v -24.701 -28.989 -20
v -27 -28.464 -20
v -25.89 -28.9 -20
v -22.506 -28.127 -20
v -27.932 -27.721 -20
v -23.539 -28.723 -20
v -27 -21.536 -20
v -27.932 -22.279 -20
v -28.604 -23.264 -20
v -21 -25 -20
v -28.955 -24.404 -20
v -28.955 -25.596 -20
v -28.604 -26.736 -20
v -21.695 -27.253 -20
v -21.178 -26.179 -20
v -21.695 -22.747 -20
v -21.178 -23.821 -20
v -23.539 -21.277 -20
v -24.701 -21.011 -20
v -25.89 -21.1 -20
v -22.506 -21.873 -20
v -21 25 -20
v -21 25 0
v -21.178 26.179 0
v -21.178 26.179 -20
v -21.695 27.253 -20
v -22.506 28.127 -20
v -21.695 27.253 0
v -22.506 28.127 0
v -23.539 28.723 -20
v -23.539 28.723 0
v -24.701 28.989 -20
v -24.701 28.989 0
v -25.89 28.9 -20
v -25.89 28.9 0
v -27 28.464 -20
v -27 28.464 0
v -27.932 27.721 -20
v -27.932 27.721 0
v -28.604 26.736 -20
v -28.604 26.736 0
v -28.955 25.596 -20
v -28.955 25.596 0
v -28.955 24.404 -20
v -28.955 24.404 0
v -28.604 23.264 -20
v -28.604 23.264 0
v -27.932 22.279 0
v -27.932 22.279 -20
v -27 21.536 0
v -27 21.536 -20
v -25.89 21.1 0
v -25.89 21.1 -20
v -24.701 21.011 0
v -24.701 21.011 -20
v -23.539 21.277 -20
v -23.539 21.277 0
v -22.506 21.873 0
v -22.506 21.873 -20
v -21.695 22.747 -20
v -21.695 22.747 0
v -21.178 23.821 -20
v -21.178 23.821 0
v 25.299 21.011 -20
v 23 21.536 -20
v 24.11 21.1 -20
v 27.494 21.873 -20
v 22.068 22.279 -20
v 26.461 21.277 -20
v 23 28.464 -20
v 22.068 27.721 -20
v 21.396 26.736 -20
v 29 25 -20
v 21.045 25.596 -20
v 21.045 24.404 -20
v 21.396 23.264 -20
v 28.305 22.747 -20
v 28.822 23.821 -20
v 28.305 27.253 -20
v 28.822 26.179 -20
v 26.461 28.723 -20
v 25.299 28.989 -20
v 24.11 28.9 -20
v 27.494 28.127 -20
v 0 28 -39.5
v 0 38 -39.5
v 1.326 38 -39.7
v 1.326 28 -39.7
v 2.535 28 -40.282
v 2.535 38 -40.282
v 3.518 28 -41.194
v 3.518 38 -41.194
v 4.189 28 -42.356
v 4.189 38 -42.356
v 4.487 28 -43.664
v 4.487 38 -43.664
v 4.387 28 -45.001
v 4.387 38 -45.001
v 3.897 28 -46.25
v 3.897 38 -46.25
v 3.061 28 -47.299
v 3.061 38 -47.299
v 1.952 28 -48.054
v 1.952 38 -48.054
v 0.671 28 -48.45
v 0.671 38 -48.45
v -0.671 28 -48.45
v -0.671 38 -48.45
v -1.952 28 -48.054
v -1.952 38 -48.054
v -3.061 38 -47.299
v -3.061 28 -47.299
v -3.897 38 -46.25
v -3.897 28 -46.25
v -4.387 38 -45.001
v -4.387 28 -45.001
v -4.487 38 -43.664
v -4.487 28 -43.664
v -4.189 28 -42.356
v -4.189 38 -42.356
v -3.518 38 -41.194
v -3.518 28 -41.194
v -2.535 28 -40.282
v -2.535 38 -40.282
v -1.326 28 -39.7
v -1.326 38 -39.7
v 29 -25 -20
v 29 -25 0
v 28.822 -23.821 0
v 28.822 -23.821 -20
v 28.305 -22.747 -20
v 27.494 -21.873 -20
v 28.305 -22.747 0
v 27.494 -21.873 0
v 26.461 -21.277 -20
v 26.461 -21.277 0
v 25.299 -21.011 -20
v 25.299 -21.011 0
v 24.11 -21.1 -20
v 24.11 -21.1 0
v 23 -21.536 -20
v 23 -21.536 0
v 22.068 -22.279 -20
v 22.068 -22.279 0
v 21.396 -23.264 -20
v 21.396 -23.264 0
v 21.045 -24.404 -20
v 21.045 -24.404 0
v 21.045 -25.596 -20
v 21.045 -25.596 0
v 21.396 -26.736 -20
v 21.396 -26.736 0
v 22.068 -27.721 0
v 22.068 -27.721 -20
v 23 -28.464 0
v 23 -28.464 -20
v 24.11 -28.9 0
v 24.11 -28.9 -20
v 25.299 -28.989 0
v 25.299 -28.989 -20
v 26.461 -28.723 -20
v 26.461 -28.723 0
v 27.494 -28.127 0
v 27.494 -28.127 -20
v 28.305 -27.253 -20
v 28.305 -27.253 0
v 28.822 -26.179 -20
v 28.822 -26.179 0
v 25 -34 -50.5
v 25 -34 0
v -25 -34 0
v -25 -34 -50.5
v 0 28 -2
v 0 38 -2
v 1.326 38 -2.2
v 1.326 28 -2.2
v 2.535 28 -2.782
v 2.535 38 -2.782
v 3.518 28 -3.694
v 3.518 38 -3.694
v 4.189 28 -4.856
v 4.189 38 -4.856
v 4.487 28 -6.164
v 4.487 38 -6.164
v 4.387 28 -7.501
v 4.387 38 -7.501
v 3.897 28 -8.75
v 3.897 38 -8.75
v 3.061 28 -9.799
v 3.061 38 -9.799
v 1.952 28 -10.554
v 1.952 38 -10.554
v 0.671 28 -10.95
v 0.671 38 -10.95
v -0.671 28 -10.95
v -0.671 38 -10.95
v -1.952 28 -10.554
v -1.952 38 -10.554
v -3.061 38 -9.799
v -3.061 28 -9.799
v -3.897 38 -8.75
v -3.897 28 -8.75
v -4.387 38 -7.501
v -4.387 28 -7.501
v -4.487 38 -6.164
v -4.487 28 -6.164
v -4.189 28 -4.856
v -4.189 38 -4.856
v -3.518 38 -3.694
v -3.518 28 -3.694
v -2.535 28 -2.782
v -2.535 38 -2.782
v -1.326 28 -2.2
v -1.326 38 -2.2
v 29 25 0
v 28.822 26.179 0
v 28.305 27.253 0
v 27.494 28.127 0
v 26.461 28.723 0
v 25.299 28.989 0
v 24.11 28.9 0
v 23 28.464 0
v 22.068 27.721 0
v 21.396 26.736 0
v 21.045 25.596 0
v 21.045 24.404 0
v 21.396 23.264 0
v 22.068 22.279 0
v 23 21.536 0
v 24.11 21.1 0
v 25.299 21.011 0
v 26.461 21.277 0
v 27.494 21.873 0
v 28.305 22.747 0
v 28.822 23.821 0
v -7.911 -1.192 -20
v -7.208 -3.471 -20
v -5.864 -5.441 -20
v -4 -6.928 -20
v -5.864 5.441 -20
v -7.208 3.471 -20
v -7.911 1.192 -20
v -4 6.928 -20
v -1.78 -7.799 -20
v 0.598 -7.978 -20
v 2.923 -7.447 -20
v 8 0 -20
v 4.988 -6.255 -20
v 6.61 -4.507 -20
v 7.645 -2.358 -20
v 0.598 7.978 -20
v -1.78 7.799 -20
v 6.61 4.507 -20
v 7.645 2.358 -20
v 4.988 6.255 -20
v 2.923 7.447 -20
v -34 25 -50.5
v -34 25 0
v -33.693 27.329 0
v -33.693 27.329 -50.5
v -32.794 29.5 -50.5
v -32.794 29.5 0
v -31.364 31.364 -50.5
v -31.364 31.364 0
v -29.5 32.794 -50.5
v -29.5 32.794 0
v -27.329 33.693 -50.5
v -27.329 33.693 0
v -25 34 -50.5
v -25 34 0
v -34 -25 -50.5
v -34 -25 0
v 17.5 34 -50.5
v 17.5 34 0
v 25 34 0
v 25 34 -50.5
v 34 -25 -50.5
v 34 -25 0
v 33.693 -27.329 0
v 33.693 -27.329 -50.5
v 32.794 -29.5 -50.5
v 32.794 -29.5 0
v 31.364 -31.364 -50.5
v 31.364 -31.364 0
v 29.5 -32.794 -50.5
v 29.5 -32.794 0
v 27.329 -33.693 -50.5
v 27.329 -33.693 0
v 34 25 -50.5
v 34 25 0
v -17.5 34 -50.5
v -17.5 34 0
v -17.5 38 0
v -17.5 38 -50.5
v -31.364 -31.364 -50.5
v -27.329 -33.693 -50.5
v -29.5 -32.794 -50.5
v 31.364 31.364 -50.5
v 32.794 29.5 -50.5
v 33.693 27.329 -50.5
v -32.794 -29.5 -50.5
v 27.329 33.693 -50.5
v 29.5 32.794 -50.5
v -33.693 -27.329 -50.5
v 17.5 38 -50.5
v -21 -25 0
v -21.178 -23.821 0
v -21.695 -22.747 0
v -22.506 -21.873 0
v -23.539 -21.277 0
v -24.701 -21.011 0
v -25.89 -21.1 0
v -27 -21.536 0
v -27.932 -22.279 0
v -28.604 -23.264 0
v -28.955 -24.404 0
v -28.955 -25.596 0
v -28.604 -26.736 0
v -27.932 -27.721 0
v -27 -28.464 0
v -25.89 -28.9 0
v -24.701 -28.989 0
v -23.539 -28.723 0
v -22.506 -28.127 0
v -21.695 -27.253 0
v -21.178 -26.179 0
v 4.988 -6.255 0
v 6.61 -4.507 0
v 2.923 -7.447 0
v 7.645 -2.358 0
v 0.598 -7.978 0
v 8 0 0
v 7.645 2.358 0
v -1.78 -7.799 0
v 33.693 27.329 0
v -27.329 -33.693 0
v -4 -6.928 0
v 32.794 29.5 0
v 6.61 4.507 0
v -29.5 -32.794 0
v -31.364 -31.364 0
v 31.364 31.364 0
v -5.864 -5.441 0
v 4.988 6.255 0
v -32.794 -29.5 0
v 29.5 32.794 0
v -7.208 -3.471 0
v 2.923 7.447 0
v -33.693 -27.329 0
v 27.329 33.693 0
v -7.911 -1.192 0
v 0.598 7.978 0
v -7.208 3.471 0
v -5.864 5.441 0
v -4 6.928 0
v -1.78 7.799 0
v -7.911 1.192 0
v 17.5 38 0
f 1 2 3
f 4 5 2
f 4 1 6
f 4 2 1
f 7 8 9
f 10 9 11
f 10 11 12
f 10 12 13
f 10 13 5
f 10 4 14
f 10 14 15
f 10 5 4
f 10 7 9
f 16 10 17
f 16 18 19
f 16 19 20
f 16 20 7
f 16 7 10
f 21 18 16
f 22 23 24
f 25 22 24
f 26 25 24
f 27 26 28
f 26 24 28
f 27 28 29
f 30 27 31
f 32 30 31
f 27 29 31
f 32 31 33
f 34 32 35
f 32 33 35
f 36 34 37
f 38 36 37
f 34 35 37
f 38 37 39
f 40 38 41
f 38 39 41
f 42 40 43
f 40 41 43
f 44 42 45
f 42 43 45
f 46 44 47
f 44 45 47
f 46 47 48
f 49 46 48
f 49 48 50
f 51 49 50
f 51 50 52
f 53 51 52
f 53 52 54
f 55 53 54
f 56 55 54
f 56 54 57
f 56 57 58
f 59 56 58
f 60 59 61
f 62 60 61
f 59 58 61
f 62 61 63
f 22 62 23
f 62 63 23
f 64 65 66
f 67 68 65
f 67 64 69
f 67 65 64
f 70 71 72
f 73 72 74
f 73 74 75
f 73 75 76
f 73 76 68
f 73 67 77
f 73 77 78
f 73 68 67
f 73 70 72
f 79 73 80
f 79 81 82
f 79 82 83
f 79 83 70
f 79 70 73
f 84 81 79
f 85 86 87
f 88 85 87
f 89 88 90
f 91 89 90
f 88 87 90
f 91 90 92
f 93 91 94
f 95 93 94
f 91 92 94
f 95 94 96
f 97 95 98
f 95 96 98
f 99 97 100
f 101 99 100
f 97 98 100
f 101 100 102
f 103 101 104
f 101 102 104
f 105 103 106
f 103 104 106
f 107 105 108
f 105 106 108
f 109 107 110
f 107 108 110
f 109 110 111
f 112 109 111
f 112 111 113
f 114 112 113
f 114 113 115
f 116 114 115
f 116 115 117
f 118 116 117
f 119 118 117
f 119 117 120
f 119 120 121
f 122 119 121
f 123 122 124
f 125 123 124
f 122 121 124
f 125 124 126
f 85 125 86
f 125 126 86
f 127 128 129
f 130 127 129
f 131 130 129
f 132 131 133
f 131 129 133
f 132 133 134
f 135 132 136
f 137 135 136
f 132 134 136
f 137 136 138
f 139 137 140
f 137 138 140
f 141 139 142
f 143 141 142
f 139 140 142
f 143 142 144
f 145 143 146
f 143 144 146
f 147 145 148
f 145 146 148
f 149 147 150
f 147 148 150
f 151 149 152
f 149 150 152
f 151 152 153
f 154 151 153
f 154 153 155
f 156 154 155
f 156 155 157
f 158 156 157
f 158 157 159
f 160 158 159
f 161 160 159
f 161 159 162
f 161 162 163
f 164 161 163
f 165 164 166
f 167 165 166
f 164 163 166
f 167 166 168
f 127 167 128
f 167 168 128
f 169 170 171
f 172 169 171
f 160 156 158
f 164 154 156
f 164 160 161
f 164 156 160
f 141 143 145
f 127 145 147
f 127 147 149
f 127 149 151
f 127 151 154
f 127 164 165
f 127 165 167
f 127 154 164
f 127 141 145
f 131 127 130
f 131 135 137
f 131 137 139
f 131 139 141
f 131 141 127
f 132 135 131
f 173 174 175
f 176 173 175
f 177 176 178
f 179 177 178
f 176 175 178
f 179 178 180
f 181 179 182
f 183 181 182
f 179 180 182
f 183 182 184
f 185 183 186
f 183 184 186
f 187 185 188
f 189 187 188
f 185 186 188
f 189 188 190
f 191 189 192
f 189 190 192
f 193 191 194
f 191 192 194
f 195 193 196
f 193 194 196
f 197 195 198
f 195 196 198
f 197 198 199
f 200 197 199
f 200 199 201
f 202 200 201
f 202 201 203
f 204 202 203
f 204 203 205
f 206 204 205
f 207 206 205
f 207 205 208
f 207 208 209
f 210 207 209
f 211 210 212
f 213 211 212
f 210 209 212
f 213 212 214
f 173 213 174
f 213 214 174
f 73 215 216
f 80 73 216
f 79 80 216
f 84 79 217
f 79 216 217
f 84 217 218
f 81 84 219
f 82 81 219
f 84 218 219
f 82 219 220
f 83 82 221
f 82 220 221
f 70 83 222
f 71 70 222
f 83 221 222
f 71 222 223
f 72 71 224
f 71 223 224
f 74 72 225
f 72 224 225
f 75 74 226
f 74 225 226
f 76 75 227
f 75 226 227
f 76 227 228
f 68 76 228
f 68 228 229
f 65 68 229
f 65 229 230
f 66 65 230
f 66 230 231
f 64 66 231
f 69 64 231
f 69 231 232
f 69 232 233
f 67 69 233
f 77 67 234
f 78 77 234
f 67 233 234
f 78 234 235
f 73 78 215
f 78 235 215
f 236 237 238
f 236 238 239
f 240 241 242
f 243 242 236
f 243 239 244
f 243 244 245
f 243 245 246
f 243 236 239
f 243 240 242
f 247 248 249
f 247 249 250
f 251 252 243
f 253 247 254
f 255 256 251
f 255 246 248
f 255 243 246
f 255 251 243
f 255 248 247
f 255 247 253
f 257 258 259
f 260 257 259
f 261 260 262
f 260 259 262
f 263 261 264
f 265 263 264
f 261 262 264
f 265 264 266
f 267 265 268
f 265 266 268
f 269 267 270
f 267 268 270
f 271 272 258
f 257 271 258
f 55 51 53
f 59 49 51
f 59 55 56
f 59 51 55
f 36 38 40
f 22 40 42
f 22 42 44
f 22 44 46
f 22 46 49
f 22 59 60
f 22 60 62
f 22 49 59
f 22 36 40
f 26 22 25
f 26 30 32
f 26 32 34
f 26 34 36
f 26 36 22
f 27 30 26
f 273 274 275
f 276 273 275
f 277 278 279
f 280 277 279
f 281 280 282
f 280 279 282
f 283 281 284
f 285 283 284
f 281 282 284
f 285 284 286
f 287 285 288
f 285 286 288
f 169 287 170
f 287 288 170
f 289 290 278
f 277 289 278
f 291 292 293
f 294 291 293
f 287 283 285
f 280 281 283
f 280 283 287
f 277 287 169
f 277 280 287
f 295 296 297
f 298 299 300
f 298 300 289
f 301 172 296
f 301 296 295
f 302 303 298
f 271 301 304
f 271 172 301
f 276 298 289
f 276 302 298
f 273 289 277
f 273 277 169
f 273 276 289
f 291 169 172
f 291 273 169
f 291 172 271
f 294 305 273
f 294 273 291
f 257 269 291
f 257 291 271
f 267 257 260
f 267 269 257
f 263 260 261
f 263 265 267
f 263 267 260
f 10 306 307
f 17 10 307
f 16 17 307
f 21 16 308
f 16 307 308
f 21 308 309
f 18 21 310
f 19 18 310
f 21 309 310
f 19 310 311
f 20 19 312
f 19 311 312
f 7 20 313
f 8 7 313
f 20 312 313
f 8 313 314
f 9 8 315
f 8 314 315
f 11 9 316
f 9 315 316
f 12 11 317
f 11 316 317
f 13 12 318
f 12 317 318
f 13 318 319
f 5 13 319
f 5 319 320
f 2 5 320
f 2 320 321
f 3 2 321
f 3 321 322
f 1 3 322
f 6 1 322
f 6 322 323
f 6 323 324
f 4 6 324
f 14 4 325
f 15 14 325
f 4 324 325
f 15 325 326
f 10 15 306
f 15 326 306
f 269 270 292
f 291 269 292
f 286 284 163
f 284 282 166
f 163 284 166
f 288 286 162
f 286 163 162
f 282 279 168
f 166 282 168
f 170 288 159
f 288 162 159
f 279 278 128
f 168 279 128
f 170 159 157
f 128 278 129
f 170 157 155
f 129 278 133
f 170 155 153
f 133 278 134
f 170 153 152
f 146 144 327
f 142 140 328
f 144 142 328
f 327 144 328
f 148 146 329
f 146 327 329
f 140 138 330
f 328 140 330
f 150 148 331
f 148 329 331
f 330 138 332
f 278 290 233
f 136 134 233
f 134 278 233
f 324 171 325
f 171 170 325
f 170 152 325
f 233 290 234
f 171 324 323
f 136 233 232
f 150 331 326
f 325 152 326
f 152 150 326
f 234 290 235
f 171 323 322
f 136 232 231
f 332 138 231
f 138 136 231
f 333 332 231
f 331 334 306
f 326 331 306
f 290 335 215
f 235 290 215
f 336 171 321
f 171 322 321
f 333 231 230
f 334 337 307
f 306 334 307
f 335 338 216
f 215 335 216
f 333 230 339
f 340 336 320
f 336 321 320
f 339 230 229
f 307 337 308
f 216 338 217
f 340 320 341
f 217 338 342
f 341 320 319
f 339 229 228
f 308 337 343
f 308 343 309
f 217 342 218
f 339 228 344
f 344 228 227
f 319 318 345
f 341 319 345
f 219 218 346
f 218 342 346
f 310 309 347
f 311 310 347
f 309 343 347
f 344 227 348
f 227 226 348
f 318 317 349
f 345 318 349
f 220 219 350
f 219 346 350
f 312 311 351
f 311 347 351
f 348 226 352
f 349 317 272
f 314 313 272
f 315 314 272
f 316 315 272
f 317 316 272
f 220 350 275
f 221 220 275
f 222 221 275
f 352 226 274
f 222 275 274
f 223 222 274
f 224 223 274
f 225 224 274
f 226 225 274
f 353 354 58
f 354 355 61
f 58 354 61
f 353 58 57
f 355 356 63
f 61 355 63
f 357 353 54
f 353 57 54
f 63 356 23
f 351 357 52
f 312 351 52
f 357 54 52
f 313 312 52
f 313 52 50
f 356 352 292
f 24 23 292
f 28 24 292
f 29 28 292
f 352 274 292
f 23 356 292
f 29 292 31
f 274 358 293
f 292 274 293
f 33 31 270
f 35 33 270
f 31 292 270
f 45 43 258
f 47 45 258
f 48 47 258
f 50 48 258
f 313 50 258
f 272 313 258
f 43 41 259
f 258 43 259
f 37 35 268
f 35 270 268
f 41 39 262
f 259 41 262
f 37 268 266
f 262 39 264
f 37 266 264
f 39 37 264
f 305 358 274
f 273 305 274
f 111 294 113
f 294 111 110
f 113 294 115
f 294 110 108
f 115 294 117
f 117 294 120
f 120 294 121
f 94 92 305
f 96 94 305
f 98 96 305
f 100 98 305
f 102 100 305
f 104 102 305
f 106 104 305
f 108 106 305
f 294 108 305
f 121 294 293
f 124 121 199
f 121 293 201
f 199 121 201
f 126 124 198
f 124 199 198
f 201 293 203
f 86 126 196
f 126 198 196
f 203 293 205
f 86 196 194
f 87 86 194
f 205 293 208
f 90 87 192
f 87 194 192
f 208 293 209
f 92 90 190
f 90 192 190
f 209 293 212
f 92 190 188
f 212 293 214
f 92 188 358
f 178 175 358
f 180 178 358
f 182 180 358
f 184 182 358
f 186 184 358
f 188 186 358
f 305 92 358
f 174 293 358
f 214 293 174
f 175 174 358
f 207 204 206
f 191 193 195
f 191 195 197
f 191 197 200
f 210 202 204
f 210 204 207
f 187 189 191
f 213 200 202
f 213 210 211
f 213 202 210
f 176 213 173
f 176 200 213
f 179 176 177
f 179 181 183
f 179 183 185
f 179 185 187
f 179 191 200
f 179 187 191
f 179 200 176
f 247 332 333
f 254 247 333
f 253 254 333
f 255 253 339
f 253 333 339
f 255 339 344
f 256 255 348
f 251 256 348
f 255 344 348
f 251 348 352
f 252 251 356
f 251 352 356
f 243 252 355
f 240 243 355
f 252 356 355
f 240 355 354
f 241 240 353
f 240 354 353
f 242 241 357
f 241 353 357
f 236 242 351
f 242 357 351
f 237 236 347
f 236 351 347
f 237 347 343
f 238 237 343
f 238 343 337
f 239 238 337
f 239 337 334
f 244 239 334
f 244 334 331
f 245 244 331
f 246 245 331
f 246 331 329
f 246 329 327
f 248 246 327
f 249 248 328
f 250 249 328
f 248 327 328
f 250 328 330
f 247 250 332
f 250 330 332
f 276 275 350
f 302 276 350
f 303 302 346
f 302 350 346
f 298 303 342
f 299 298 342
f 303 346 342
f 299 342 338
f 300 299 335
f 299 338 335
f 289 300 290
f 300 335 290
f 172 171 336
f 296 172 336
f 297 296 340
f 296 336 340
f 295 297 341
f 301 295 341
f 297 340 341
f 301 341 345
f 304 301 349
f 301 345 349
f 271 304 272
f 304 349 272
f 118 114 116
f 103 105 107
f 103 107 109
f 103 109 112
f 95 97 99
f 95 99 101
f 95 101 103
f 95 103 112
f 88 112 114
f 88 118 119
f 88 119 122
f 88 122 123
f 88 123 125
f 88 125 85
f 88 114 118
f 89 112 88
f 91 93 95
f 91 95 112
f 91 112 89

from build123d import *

# Parameters (mm, degrees)
SALIENTE_EXTRUIR1_DEPTH = 50.5
CROQUIS2_R              = 4
CORTAR_EXTRUIR1_DEPTH   = 20
CROQUIS3_R              = 8
CORTAR_EXTRUIR2_DEPTH   = 20
CROQUIS4_R              = 4.5
CORTAR_EXTRUIR3_DEPTH   = 10


with BuildPart() as part:
    # Croquis1 → Saliente-Extruir1 (new body)
    with BuildSketch(Plane.XY):
        with BuildLine():
            Line((-17.5, 34), (-17.5, 38))
            Line((-17.5, 38), (17.5, 38))
            Line((17.5, 38), (17.5, 34))
            Line((17.5, 34), (25, 34))
            ThreePointArc((25, 34), (31.363961031, 31.363961031), (34, 25))
            Line((34, 25), (34, -25))
            ThreePointArc((34, -25), (31.363961031, -31.363961031), (25, -34))
            Line((25, -34), (-25, -34))
            ThreePointArc((-25, -34), (-31.363961031, -31.363961031), (-34, -25))
            Line((-34, -25), (-34, 25))
            ThreePointArc((-34, 25), (-31.363961031, 31.363961031), (-25, 34))
            Line((-25, 34), (-17.5, 34))
        make_face()
    extrude(amount=-SALIENTE_EXTRUIR1_DEPTH)

    # Croquis2 → Cortar-Extruir1 (cut)
    with BuildSketch(Plane.XY):
        with Locations((-25, 25)):
            Circle(CROQUIS2_R)
        with Locations((-25, -25)):
            Circle(CROQUIS2_R)
        with Locations((25, -25)):
            Circle(CROQUIS2_R)
        with Locations((25, 25)):
            Circle(CROQUIS2_R)
    extrude(amount=-CORTAR_EXTRUIR1_DEPTH, mode=Mode.SUBTRACT)

    # Croquis3 → Cortar-Extruir2 (cut)
    with BuildSketch(Plane.XY):
        Circle(CROQUIS3_R)
    extrude(amount=-CORTAR_EXTRUIR2_DEPTH, mode=Mode.SUBTRACT)

    # Croquis4 → Cortar-Extruir3 (cut)
    with BuildSketch(Plane(origin=(0, 38, 0), x_dir=(1, 0, 0), z_dir=(0, 1, 0))):
        with Locations(Location((0, 6.5, 0), (0, 0, 270))):
            Circle(CROQUIS4_R)
        with Locations(Location((0, 44, 0), (0, 0, 270))):
            Circle(CROQUIS4_R)
    extrude(amount=-CORTAR_EXTRUIR3_DEPTH, mode=Mode.SUBTRACT)


solid = part.part
